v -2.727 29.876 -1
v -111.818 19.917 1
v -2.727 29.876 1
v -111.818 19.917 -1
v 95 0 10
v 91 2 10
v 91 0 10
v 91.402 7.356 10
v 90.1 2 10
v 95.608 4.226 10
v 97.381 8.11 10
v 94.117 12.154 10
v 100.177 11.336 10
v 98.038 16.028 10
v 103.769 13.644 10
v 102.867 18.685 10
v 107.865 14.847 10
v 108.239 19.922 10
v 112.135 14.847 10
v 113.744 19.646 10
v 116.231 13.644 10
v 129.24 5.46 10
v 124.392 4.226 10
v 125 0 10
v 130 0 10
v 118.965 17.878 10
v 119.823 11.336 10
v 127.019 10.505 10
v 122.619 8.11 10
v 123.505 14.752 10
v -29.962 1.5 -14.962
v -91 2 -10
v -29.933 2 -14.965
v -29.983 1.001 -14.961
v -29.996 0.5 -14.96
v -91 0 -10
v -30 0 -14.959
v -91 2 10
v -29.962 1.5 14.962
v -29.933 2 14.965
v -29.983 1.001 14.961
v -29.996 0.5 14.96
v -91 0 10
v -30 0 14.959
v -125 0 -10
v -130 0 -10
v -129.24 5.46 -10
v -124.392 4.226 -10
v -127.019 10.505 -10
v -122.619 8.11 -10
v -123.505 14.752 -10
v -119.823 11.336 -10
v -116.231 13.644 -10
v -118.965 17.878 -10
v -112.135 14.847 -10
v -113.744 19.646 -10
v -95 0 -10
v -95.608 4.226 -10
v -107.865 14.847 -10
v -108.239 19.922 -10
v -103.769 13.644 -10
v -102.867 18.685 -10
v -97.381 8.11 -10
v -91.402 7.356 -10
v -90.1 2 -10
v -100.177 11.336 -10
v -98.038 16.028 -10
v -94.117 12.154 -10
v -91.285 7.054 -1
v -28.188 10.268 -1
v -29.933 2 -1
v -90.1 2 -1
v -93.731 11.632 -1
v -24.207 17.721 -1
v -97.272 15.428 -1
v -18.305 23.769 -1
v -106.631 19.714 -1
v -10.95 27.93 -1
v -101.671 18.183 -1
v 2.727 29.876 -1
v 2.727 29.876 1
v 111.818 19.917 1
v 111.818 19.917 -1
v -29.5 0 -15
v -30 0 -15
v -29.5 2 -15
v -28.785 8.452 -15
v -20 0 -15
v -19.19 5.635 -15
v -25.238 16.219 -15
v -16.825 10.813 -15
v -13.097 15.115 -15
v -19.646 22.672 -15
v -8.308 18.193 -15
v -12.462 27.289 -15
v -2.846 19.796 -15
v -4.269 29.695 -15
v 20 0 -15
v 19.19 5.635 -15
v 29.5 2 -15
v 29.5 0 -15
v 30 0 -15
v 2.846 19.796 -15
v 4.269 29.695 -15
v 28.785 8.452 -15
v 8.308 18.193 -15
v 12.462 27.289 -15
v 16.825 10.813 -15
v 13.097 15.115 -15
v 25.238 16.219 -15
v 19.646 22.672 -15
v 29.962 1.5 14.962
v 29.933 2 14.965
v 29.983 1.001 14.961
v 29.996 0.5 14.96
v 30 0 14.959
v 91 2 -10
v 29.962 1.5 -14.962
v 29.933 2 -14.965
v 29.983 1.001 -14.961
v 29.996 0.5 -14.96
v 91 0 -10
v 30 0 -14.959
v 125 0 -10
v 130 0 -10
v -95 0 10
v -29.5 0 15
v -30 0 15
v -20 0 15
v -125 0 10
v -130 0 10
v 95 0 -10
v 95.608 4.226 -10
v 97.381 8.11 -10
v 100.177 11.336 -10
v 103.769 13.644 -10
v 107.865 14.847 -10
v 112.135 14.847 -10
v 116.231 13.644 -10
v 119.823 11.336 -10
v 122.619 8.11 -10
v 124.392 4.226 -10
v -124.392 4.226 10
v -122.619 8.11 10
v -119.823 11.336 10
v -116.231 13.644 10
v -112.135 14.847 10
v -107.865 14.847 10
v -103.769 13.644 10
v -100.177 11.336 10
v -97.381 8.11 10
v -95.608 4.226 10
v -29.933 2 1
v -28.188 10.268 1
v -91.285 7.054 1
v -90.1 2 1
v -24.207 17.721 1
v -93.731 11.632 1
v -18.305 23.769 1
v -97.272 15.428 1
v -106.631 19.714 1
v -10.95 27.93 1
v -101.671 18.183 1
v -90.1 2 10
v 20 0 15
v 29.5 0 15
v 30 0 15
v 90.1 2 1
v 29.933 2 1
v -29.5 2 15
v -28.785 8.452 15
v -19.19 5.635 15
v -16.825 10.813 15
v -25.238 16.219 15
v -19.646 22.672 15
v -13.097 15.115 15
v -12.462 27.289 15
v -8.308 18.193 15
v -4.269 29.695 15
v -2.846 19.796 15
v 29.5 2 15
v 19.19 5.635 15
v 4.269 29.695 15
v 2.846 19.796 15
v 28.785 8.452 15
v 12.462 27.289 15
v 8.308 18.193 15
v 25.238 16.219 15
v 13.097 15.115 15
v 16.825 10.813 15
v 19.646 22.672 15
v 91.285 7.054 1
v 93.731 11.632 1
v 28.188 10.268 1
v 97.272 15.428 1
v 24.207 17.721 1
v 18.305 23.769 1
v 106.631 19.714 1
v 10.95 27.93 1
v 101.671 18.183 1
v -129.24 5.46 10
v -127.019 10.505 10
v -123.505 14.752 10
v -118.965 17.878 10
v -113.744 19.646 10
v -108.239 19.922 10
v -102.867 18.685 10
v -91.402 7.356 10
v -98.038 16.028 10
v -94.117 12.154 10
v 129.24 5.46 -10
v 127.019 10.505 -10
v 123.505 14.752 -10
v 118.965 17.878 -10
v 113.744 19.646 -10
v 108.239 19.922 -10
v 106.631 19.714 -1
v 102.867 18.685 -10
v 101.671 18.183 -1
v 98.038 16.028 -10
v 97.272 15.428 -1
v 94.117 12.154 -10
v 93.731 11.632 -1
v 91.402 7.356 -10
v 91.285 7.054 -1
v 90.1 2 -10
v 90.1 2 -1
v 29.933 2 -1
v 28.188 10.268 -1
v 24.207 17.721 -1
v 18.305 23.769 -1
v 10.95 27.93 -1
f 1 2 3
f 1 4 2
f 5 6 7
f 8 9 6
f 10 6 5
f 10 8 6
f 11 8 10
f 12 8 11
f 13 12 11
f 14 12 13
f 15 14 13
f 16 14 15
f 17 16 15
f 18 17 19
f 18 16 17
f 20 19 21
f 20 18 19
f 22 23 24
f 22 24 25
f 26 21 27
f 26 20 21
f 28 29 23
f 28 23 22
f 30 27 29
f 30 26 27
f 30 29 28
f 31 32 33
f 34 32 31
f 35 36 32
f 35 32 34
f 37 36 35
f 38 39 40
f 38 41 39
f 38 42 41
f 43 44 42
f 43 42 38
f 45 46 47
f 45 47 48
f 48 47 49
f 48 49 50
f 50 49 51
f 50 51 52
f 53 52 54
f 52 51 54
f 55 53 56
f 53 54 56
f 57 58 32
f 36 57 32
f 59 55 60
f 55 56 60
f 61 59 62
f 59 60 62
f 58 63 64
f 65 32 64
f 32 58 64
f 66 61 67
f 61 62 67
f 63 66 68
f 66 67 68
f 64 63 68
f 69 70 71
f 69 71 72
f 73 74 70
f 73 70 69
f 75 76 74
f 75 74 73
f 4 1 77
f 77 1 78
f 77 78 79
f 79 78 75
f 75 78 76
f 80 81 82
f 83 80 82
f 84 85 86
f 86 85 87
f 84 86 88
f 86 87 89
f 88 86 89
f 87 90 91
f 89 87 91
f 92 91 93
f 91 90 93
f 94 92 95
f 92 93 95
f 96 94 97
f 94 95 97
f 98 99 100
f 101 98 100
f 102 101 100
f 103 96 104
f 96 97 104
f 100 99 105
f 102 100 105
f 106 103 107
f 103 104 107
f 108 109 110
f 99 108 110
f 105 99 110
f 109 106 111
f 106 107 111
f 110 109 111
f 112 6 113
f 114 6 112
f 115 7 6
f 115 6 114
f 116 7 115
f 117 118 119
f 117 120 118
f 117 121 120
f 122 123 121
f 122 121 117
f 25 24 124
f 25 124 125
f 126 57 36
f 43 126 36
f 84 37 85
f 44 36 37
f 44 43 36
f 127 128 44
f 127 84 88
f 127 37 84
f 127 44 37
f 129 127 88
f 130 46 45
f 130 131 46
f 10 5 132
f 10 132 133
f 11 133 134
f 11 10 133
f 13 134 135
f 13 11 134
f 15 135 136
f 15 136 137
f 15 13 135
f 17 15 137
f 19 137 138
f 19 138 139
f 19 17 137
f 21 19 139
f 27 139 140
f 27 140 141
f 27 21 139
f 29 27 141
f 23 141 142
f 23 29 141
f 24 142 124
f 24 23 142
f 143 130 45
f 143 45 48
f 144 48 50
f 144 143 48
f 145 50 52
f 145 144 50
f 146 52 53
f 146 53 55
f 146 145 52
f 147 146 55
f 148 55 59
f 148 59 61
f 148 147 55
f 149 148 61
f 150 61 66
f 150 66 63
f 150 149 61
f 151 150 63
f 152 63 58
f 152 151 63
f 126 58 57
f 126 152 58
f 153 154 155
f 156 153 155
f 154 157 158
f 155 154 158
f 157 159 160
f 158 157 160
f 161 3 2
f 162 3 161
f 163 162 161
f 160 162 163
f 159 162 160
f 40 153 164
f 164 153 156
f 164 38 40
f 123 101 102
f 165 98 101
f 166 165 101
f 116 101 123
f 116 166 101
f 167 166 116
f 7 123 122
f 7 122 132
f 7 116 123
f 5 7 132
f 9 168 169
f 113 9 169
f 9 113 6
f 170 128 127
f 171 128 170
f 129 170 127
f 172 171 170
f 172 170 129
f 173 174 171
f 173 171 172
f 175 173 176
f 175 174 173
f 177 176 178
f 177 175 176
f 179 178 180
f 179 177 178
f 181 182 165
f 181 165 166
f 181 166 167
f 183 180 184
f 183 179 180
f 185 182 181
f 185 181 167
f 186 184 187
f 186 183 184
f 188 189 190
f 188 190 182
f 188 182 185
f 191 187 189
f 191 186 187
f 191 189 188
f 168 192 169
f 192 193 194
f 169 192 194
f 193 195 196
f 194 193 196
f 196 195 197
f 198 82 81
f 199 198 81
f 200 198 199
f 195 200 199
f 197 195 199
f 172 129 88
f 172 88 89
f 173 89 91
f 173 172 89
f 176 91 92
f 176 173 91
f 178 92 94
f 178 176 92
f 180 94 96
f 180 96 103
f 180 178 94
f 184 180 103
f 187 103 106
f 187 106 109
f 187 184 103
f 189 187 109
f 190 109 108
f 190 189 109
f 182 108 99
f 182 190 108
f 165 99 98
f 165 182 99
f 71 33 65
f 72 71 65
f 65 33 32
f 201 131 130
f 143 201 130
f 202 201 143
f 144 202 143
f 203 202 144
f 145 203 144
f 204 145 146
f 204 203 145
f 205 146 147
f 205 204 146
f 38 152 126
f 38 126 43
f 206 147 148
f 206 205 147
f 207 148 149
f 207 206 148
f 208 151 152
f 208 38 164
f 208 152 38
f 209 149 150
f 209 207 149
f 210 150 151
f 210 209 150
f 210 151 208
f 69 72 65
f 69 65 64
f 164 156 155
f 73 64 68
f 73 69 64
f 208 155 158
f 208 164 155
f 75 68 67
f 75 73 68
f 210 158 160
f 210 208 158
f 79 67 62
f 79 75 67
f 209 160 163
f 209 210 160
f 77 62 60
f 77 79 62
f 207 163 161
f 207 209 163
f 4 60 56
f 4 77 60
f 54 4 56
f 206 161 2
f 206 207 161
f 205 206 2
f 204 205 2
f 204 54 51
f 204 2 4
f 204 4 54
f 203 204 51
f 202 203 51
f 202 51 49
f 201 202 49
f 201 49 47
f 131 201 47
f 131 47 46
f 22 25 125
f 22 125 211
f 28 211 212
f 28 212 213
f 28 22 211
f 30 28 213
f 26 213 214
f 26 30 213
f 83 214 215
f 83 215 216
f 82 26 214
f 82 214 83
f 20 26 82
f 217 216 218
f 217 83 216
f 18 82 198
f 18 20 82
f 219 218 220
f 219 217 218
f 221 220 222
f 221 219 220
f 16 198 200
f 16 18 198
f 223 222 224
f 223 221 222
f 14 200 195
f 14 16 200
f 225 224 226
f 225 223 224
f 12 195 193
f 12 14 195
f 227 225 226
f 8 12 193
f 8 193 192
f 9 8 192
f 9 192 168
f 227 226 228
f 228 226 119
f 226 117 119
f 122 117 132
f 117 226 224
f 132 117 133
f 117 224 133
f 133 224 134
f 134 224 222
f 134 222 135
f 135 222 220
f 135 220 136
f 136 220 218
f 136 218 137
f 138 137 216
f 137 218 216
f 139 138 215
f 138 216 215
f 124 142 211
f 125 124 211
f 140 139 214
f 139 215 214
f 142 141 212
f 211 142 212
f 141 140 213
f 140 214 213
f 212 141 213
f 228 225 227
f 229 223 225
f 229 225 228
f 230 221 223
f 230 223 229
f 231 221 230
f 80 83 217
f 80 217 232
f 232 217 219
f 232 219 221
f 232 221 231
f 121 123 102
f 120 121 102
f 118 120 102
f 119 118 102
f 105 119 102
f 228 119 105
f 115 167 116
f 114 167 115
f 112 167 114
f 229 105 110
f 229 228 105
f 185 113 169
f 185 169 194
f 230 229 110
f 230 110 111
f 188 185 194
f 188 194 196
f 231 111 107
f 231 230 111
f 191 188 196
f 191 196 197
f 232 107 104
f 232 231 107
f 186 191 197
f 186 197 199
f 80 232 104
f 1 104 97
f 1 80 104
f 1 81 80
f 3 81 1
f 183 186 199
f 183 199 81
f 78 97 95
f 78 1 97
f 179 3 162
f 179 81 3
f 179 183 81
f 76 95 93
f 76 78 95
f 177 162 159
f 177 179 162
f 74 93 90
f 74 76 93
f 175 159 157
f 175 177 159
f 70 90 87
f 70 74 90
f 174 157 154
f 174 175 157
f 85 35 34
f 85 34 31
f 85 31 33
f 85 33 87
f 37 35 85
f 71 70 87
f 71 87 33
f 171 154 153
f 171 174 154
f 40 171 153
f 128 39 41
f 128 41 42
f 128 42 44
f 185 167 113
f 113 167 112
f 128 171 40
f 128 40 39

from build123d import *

# Parameters (mm, degrees)
BOSS_EXTRUDE1_DEPTH   = 15
BOSS_EXTRUDE2_DEPTH   = 10
BOSS_EXTRUDE2_2_DEPTH = 10
BOSS_EXTRUDE3_DEPTH   = 1
BOSS_EXTRUDE8_DEPTH   = 2


with BuildPart() as part:
    # Sketch1 → Boss-Extrude1 (new, symmetric)
    with BuildSketch(Plane.XY):
        with BuildLine():
            Line((-30, 0), (-20, 0))
            ThreePointArc((-20, 0), (0, 20), (20, 0))
            Line((20, 0), (30, 0))
            ThreePointArc((30, 0), (0, 30), (-30, 0))
        make_face()
    extrude(amount=BOSS_EXTRUDE1_DEPTH, both=True)



with BuildPart() as body_2:
    # Sketch1<3> → Boss-Extrude2 (new, symmetric)
    with BuildSketch(Plane.XY):
        with BuildLine():
            Line((-130, 0), (-125, 0))
            ThreePointArc((-125, 0), (-110, 15), (-95, 0))
            Line((-95, 0), (-90, 0))
            ThreePointArc((-90, 0), (-110, 20), (-130, 0))
        make_face()
    extrude(amount=BOSS_EXTRUDE2_DEPTH, both=True)


with BuildPart() as body_3:
    # Sketch1<3> → Boss-Extrude2 2 (new, symmetric)
    with BuildSketch(Plane.XY):
        with BuildLine():
            Line((90, 0), (95, 0))
            ThreePointArc((95, 0), (110, 15), (125, 0))
            Line((125, 0), (130, 0))
            ThreePointArc((130, 0), (110, 20), (90, 0))
        make_face()
    extrude(amount=BOSS_EXTRUDE2_2_DEPTH, both=True)


with BuildPart() as part_1:
    add(part.part)

    add(body_2.part)  # Boss-Extrude3 merges body 2

    add(body_3.part)  # Boss-Extrude3 merges body 3
    # Sketch2 → Boss-Extrude3 (add, symmetric)
    with BuildSketch(Plane.XY):
        with BuildLine():
            Line((-111.818181818, 19.917183909), (-2.727272727, 29.875775864))
            ThreePointArc((-2.727272727, 29.875775864), (-22.156468376, 20.225995874), (-30, 0))
            Line((-30, 0), (-90, 0))
            ThreePointArc((-90, 0), (-96.516002751, 14.770978918), (-111.818181818, 19.917183909))
        make_face()
        with BuildLine():
            Line((2.727272727, 29.875775864), (111.818181818, 19.917183909))
            ThreePointArc((111.818181818, 19.917183909), (96.516002751, 14.770978918), (90, 0))
            Line((90, 0), (30, 0))
            ThreePointArc((30, 0), (22.156468376, 20.225995874), (2.727272727, 29.875775864))
        make_face()
    extrude(amount=BOSS_EXTRUDE3_DEPTH, both=True)

    # Sketch3 → Boss-Extrude8 (add)
    with BuildSketch(Plane(origin=(0, 0, 0), x_dir=(1, 0, 0), z_dir=(0, 1, 0))):
        Polygon((91, 10), (91, -10), (29.5, -15), (29.5, 15), align=None)
        Polygon((-29.5, 15), (-29.5, -15), (-91, -10), (-91, 10), align=None)
    extrude(amount=BOSS_EXTRUDE8_DEPTH)


solid = part_1.part
